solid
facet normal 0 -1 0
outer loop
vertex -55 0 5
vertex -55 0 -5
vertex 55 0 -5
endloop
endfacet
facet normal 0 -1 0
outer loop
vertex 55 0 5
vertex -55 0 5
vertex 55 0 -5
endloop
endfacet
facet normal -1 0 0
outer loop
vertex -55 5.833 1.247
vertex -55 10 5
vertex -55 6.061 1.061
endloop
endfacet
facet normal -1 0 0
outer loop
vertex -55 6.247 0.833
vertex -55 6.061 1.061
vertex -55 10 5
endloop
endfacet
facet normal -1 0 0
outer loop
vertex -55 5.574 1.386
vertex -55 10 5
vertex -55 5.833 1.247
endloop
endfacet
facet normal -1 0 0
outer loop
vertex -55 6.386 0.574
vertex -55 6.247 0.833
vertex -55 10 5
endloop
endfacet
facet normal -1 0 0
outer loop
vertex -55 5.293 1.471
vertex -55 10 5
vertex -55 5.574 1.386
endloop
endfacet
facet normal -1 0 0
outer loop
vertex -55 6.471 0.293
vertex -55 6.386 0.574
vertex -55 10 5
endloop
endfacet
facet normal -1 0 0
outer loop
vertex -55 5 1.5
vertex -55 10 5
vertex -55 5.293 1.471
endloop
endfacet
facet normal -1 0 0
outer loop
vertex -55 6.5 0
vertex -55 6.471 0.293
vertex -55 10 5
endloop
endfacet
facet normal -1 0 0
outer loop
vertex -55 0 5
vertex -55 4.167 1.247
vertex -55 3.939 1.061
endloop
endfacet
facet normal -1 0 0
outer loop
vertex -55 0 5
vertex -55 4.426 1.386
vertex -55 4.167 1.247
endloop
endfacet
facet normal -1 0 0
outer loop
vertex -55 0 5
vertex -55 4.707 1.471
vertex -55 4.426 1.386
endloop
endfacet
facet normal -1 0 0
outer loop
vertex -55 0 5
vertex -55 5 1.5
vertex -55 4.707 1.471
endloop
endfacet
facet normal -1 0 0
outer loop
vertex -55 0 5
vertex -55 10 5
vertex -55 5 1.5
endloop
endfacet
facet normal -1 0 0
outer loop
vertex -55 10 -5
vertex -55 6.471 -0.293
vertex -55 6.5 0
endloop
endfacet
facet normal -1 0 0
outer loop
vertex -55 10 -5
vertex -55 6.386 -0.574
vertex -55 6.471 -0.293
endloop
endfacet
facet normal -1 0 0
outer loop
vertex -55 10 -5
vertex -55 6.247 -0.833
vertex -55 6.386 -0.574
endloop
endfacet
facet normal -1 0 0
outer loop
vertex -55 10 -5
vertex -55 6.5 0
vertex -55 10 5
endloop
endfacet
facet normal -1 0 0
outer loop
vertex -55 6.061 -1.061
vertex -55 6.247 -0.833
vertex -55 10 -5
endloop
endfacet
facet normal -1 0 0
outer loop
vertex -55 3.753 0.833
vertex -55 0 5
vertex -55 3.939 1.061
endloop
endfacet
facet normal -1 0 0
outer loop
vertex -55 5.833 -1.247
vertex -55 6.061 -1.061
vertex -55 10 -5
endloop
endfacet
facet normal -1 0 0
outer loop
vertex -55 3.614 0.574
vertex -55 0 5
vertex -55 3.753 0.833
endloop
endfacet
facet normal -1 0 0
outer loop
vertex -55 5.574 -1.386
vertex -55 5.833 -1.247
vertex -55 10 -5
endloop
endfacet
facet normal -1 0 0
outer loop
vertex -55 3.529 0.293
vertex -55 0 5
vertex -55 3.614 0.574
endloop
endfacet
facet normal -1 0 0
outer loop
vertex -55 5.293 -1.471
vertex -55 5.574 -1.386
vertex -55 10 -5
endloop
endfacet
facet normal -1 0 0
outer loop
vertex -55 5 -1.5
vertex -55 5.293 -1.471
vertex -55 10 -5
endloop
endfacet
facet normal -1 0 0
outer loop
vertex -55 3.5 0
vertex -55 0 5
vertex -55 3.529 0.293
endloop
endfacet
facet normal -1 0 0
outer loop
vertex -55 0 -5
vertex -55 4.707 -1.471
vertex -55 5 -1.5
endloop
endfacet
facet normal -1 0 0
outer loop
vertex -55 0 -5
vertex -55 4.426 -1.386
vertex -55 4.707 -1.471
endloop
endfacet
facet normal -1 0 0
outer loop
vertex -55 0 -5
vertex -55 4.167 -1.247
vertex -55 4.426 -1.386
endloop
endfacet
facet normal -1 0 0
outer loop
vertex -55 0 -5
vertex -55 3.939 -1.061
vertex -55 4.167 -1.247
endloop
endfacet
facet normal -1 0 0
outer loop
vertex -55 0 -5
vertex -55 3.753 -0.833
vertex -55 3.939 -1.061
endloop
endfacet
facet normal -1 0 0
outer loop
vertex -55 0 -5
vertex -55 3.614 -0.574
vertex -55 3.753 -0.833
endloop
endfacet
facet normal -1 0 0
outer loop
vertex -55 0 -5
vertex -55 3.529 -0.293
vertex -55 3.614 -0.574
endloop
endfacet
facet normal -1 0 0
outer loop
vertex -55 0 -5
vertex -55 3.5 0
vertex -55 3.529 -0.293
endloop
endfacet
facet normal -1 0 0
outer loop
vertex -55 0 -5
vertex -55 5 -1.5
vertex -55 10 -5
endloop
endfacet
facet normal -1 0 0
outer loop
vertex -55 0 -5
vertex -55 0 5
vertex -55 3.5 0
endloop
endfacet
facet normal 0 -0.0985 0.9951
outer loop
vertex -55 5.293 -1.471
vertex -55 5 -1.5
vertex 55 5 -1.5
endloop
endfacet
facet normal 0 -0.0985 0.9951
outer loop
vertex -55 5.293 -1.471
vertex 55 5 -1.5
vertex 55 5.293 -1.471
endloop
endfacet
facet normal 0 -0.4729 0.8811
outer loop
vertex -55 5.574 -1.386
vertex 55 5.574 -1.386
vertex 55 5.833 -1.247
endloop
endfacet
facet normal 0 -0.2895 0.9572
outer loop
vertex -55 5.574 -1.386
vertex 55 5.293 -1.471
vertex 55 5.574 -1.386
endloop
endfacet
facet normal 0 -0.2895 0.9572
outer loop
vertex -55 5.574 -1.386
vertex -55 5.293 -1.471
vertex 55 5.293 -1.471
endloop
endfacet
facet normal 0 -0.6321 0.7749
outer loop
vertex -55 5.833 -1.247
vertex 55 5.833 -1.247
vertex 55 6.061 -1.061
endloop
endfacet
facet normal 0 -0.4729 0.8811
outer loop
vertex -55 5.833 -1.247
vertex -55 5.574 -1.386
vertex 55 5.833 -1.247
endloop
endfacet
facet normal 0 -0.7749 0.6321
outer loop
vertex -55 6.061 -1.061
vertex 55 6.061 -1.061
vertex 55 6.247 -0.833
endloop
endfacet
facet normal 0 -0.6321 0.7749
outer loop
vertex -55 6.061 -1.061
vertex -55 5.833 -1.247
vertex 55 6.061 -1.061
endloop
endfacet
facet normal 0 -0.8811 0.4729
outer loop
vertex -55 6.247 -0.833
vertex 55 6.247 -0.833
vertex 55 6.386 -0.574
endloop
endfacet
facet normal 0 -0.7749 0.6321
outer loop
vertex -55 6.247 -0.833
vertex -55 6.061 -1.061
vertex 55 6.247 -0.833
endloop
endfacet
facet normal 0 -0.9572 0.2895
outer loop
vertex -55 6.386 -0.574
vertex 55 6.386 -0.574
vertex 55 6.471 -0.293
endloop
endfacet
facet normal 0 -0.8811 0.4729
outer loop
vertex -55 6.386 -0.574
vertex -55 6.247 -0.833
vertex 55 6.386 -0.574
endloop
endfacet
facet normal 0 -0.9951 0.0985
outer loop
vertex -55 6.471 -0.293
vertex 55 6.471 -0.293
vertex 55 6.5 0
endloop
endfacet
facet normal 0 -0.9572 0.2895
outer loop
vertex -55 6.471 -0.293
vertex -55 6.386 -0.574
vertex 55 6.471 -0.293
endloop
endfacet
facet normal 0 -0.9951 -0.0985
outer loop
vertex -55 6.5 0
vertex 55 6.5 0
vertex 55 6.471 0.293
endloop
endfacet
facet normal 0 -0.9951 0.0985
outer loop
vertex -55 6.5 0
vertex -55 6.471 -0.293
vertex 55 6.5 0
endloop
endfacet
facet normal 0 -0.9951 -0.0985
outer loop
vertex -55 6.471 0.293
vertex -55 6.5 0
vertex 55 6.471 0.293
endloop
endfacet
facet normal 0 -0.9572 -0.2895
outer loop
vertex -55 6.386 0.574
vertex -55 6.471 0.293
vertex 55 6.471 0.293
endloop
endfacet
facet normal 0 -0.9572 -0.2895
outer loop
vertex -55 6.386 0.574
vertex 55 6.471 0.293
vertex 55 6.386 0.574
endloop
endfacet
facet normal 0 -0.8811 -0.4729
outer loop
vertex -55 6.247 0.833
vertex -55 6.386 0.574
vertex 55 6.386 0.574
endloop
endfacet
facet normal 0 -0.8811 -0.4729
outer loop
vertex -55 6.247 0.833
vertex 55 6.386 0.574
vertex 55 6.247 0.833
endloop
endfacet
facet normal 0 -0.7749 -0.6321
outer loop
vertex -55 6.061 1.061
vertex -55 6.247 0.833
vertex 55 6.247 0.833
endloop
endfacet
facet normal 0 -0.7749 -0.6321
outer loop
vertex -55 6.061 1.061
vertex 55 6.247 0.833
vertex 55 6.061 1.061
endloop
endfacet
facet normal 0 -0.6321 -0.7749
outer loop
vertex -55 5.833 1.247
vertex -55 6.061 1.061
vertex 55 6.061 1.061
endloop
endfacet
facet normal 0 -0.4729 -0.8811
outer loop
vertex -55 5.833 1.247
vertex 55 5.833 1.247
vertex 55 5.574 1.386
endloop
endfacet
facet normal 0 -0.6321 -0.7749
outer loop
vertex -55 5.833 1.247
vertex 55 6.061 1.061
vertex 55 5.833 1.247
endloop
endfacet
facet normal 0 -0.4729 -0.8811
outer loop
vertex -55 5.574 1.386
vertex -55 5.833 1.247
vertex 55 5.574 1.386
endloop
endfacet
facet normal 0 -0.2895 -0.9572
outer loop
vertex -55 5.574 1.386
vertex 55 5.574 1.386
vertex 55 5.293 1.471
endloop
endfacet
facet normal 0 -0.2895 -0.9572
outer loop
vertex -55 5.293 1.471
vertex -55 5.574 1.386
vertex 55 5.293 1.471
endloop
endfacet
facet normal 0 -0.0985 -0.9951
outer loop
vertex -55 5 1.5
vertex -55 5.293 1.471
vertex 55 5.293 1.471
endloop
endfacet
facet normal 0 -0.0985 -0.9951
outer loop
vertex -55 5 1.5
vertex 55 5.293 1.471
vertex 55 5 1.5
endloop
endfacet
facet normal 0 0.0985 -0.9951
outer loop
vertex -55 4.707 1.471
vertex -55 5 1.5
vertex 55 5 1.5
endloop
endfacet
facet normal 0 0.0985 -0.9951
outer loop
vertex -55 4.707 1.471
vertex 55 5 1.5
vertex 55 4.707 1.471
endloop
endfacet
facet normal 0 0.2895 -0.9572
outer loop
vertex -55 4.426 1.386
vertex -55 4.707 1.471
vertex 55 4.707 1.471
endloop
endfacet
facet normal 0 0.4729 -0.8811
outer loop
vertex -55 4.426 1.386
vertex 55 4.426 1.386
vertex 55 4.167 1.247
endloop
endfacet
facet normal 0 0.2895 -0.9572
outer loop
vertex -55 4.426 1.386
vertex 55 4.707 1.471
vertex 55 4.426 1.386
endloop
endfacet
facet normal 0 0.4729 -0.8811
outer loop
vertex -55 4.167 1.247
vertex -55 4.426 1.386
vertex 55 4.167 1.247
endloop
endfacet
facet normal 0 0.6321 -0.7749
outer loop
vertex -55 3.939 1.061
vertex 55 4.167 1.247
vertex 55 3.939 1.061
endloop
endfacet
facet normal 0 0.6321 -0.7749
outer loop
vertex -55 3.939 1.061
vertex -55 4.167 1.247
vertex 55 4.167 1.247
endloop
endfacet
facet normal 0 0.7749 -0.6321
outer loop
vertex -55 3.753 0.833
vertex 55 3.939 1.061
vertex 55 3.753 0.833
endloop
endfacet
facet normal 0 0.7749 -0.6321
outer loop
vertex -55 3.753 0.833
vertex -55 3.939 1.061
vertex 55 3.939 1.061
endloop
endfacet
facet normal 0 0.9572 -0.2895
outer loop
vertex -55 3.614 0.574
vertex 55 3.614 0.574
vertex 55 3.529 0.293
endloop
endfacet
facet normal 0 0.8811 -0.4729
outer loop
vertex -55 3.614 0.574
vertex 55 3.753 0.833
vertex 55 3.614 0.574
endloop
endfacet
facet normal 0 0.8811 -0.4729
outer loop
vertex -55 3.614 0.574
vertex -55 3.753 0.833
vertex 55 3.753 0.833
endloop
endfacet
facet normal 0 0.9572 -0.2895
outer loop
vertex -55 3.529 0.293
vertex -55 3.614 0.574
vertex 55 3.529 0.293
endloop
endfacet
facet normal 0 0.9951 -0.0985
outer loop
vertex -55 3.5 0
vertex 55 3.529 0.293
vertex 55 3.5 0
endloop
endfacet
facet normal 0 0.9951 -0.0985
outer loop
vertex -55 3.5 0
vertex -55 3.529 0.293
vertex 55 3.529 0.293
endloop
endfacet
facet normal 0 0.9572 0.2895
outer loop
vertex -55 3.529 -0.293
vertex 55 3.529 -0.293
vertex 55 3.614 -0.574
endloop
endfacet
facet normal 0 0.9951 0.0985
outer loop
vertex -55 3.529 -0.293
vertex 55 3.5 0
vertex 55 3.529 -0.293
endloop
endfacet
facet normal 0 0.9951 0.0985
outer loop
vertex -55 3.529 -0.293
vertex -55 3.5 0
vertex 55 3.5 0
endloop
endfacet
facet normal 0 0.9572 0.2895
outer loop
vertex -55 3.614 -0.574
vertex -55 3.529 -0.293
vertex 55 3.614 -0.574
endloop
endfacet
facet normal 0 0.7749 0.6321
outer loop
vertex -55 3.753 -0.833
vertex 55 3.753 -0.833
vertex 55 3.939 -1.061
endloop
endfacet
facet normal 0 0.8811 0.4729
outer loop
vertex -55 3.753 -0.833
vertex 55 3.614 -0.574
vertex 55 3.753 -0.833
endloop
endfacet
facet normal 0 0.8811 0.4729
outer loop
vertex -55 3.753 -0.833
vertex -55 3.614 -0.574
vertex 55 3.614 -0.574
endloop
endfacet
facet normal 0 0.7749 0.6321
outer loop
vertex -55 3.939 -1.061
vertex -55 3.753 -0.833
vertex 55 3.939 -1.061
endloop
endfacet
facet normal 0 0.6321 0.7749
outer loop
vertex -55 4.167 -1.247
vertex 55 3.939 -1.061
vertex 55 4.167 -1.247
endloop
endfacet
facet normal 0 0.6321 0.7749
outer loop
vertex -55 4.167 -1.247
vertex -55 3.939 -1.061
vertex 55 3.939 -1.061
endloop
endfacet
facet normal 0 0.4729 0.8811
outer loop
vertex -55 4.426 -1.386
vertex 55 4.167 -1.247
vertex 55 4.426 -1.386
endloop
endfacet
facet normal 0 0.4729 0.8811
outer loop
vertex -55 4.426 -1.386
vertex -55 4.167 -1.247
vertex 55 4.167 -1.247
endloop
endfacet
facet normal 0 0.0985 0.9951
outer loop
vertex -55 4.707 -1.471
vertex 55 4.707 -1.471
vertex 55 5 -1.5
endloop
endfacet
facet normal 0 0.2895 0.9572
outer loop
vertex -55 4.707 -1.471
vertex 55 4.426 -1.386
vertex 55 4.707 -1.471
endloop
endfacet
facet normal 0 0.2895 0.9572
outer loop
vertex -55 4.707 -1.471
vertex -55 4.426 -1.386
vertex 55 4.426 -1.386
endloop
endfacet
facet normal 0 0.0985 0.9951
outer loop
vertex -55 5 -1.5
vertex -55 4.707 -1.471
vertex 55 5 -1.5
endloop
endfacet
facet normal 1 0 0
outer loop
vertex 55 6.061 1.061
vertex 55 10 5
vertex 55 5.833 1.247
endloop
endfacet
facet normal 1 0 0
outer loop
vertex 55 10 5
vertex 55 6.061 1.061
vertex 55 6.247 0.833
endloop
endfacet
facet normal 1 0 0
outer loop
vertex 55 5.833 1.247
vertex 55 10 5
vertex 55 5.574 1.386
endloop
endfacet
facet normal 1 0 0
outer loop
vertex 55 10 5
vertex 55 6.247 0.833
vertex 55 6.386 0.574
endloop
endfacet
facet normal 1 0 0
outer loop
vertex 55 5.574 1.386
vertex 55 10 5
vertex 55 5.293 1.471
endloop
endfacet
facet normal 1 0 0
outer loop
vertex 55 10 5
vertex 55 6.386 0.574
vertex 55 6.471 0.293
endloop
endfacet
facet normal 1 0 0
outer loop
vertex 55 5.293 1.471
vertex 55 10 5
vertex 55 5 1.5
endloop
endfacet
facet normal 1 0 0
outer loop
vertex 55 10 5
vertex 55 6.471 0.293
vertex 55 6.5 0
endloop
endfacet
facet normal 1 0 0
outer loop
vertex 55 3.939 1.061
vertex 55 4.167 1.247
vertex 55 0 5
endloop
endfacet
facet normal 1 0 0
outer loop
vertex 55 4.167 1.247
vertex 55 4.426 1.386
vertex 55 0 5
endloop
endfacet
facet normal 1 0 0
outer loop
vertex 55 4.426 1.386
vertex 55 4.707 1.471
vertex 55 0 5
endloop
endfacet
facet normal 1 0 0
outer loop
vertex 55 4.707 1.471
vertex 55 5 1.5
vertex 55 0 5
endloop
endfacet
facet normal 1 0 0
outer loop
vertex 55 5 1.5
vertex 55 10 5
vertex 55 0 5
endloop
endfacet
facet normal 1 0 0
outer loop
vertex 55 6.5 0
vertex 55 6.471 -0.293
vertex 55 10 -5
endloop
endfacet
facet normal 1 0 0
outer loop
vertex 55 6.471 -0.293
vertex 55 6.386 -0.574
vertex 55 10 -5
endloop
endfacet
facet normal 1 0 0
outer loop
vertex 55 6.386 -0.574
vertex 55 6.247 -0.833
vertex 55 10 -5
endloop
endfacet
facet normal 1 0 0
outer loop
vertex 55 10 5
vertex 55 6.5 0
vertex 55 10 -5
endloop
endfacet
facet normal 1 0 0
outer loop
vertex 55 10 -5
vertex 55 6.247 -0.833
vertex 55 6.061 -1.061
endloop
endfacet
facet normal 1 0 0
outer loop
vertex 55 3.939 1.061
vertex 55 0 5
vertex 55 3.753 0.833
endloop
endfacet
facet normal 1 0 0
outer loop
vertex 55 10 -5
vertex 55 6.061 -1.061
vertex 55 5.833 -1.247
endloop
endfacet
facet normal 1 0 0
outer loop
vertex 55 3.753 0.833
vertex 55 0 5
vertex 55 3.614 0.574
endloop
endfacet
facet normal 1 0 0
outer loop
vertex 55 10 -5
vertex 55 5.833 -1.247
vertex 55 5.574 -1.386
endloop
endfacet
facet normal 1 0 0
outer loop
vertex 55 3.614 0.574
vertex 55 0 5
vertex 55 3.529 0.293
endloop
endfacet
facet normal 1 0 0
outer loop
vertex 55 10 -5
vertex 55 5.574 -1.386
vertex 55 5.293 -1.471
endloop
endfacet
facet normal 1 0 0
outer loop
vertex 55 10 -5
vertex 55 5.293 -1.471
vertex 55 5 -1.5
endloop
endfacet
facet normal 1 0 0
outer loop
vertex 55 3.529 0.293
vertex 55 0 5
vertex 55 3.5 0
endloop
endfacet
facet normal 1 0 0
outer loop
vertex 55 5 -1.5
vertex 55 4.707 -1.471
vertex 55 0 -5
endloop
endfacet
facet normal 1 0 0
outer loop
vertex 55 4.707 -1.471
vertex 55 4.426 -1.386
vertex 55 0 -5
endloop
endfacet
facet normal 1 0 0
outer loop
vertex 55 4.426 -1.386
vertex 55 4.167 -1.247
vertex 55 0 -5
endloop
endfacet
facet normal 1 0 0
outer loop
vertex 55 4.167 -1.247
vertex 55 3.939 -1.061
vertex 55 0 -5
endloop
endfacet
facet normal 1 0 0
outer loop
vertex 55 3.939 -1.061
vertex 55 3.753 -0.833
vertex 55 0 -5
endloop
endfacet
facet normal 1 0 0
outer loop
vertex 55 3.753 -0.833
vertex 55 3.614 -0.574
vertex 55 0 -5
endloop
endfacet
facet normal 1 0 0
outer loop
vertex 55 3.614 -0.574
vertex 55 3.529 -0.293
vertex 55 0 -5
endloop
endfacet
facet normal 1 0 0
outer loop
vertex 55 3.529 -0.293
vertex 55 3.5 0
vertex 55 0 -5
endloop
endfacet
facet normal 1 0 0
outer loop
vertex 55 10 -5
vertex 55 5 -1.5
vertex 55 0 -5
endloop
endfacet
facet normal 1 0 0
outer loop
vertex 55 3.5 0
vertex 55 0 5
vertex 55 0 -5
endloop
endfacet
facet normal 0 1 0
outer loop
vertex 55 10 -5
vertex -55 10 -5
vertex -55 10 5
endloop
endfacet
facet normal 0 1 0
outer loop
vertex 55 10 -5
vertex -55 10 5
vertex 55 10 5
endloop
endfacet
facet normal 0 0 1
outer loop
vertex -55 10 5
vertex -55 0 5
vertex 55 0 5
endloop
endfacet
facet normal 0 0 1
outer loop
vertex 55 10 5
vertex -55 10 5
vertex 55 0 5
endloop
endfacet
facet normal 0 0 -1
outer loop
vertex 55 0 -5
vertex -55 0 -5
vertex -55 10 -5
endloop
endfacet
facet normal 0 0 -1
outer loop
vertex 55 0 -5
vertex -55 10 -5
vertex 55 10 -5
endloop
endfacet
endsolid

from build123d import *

# Parameters (mm, degrees)
SKETCH_1_W               = 110
SKETCH_1_H               = 10
EXTRUDE_1_DEPTH          = 10
CUT_EXTRUDE_1_DEPTH      = 57.124860802
CUT_EXTRUDE_1_DEPTH_BACK = 57.124860802
SKETCH_2_R               = 1.5


with BuildPart() as part:
    # ｽｹｯﾁ1 → ﾎﾞｽ - 押し出し1 (new body)
    with BuildSketch(Plane(origin=(0, 0, 0), x_dir=(1, 0, 0), z_dir=(0, 1, 0))):
        Rectangle(SKETCH_1_W, SKETCH_1_H)
    extrude(amount=EXTRUDE_1_DEPTH)

    # ｽｹｯﾁ2 → ｶｯﾄ - 押し出し1 (cut, two sides: drawn at the far end of the back side and taken through both)
    with BuildSketch(Plane(origin=(0, 0, 0), x_dir=(0, 0, -1), z_dir=(1, 0, 0)).offset(-CUT_EXTRUDE_1_DEPTH_BACK)):
        with Locations((0, 5)):
            Circle(SKETCH_2_R)
    extrude(amount=CUT_EXTRUDE_1_DEPTH + CUT_EXTRUDE_1_DEPTH_BACK, mode=Mode.SUBTRACT)


solid = part.part
